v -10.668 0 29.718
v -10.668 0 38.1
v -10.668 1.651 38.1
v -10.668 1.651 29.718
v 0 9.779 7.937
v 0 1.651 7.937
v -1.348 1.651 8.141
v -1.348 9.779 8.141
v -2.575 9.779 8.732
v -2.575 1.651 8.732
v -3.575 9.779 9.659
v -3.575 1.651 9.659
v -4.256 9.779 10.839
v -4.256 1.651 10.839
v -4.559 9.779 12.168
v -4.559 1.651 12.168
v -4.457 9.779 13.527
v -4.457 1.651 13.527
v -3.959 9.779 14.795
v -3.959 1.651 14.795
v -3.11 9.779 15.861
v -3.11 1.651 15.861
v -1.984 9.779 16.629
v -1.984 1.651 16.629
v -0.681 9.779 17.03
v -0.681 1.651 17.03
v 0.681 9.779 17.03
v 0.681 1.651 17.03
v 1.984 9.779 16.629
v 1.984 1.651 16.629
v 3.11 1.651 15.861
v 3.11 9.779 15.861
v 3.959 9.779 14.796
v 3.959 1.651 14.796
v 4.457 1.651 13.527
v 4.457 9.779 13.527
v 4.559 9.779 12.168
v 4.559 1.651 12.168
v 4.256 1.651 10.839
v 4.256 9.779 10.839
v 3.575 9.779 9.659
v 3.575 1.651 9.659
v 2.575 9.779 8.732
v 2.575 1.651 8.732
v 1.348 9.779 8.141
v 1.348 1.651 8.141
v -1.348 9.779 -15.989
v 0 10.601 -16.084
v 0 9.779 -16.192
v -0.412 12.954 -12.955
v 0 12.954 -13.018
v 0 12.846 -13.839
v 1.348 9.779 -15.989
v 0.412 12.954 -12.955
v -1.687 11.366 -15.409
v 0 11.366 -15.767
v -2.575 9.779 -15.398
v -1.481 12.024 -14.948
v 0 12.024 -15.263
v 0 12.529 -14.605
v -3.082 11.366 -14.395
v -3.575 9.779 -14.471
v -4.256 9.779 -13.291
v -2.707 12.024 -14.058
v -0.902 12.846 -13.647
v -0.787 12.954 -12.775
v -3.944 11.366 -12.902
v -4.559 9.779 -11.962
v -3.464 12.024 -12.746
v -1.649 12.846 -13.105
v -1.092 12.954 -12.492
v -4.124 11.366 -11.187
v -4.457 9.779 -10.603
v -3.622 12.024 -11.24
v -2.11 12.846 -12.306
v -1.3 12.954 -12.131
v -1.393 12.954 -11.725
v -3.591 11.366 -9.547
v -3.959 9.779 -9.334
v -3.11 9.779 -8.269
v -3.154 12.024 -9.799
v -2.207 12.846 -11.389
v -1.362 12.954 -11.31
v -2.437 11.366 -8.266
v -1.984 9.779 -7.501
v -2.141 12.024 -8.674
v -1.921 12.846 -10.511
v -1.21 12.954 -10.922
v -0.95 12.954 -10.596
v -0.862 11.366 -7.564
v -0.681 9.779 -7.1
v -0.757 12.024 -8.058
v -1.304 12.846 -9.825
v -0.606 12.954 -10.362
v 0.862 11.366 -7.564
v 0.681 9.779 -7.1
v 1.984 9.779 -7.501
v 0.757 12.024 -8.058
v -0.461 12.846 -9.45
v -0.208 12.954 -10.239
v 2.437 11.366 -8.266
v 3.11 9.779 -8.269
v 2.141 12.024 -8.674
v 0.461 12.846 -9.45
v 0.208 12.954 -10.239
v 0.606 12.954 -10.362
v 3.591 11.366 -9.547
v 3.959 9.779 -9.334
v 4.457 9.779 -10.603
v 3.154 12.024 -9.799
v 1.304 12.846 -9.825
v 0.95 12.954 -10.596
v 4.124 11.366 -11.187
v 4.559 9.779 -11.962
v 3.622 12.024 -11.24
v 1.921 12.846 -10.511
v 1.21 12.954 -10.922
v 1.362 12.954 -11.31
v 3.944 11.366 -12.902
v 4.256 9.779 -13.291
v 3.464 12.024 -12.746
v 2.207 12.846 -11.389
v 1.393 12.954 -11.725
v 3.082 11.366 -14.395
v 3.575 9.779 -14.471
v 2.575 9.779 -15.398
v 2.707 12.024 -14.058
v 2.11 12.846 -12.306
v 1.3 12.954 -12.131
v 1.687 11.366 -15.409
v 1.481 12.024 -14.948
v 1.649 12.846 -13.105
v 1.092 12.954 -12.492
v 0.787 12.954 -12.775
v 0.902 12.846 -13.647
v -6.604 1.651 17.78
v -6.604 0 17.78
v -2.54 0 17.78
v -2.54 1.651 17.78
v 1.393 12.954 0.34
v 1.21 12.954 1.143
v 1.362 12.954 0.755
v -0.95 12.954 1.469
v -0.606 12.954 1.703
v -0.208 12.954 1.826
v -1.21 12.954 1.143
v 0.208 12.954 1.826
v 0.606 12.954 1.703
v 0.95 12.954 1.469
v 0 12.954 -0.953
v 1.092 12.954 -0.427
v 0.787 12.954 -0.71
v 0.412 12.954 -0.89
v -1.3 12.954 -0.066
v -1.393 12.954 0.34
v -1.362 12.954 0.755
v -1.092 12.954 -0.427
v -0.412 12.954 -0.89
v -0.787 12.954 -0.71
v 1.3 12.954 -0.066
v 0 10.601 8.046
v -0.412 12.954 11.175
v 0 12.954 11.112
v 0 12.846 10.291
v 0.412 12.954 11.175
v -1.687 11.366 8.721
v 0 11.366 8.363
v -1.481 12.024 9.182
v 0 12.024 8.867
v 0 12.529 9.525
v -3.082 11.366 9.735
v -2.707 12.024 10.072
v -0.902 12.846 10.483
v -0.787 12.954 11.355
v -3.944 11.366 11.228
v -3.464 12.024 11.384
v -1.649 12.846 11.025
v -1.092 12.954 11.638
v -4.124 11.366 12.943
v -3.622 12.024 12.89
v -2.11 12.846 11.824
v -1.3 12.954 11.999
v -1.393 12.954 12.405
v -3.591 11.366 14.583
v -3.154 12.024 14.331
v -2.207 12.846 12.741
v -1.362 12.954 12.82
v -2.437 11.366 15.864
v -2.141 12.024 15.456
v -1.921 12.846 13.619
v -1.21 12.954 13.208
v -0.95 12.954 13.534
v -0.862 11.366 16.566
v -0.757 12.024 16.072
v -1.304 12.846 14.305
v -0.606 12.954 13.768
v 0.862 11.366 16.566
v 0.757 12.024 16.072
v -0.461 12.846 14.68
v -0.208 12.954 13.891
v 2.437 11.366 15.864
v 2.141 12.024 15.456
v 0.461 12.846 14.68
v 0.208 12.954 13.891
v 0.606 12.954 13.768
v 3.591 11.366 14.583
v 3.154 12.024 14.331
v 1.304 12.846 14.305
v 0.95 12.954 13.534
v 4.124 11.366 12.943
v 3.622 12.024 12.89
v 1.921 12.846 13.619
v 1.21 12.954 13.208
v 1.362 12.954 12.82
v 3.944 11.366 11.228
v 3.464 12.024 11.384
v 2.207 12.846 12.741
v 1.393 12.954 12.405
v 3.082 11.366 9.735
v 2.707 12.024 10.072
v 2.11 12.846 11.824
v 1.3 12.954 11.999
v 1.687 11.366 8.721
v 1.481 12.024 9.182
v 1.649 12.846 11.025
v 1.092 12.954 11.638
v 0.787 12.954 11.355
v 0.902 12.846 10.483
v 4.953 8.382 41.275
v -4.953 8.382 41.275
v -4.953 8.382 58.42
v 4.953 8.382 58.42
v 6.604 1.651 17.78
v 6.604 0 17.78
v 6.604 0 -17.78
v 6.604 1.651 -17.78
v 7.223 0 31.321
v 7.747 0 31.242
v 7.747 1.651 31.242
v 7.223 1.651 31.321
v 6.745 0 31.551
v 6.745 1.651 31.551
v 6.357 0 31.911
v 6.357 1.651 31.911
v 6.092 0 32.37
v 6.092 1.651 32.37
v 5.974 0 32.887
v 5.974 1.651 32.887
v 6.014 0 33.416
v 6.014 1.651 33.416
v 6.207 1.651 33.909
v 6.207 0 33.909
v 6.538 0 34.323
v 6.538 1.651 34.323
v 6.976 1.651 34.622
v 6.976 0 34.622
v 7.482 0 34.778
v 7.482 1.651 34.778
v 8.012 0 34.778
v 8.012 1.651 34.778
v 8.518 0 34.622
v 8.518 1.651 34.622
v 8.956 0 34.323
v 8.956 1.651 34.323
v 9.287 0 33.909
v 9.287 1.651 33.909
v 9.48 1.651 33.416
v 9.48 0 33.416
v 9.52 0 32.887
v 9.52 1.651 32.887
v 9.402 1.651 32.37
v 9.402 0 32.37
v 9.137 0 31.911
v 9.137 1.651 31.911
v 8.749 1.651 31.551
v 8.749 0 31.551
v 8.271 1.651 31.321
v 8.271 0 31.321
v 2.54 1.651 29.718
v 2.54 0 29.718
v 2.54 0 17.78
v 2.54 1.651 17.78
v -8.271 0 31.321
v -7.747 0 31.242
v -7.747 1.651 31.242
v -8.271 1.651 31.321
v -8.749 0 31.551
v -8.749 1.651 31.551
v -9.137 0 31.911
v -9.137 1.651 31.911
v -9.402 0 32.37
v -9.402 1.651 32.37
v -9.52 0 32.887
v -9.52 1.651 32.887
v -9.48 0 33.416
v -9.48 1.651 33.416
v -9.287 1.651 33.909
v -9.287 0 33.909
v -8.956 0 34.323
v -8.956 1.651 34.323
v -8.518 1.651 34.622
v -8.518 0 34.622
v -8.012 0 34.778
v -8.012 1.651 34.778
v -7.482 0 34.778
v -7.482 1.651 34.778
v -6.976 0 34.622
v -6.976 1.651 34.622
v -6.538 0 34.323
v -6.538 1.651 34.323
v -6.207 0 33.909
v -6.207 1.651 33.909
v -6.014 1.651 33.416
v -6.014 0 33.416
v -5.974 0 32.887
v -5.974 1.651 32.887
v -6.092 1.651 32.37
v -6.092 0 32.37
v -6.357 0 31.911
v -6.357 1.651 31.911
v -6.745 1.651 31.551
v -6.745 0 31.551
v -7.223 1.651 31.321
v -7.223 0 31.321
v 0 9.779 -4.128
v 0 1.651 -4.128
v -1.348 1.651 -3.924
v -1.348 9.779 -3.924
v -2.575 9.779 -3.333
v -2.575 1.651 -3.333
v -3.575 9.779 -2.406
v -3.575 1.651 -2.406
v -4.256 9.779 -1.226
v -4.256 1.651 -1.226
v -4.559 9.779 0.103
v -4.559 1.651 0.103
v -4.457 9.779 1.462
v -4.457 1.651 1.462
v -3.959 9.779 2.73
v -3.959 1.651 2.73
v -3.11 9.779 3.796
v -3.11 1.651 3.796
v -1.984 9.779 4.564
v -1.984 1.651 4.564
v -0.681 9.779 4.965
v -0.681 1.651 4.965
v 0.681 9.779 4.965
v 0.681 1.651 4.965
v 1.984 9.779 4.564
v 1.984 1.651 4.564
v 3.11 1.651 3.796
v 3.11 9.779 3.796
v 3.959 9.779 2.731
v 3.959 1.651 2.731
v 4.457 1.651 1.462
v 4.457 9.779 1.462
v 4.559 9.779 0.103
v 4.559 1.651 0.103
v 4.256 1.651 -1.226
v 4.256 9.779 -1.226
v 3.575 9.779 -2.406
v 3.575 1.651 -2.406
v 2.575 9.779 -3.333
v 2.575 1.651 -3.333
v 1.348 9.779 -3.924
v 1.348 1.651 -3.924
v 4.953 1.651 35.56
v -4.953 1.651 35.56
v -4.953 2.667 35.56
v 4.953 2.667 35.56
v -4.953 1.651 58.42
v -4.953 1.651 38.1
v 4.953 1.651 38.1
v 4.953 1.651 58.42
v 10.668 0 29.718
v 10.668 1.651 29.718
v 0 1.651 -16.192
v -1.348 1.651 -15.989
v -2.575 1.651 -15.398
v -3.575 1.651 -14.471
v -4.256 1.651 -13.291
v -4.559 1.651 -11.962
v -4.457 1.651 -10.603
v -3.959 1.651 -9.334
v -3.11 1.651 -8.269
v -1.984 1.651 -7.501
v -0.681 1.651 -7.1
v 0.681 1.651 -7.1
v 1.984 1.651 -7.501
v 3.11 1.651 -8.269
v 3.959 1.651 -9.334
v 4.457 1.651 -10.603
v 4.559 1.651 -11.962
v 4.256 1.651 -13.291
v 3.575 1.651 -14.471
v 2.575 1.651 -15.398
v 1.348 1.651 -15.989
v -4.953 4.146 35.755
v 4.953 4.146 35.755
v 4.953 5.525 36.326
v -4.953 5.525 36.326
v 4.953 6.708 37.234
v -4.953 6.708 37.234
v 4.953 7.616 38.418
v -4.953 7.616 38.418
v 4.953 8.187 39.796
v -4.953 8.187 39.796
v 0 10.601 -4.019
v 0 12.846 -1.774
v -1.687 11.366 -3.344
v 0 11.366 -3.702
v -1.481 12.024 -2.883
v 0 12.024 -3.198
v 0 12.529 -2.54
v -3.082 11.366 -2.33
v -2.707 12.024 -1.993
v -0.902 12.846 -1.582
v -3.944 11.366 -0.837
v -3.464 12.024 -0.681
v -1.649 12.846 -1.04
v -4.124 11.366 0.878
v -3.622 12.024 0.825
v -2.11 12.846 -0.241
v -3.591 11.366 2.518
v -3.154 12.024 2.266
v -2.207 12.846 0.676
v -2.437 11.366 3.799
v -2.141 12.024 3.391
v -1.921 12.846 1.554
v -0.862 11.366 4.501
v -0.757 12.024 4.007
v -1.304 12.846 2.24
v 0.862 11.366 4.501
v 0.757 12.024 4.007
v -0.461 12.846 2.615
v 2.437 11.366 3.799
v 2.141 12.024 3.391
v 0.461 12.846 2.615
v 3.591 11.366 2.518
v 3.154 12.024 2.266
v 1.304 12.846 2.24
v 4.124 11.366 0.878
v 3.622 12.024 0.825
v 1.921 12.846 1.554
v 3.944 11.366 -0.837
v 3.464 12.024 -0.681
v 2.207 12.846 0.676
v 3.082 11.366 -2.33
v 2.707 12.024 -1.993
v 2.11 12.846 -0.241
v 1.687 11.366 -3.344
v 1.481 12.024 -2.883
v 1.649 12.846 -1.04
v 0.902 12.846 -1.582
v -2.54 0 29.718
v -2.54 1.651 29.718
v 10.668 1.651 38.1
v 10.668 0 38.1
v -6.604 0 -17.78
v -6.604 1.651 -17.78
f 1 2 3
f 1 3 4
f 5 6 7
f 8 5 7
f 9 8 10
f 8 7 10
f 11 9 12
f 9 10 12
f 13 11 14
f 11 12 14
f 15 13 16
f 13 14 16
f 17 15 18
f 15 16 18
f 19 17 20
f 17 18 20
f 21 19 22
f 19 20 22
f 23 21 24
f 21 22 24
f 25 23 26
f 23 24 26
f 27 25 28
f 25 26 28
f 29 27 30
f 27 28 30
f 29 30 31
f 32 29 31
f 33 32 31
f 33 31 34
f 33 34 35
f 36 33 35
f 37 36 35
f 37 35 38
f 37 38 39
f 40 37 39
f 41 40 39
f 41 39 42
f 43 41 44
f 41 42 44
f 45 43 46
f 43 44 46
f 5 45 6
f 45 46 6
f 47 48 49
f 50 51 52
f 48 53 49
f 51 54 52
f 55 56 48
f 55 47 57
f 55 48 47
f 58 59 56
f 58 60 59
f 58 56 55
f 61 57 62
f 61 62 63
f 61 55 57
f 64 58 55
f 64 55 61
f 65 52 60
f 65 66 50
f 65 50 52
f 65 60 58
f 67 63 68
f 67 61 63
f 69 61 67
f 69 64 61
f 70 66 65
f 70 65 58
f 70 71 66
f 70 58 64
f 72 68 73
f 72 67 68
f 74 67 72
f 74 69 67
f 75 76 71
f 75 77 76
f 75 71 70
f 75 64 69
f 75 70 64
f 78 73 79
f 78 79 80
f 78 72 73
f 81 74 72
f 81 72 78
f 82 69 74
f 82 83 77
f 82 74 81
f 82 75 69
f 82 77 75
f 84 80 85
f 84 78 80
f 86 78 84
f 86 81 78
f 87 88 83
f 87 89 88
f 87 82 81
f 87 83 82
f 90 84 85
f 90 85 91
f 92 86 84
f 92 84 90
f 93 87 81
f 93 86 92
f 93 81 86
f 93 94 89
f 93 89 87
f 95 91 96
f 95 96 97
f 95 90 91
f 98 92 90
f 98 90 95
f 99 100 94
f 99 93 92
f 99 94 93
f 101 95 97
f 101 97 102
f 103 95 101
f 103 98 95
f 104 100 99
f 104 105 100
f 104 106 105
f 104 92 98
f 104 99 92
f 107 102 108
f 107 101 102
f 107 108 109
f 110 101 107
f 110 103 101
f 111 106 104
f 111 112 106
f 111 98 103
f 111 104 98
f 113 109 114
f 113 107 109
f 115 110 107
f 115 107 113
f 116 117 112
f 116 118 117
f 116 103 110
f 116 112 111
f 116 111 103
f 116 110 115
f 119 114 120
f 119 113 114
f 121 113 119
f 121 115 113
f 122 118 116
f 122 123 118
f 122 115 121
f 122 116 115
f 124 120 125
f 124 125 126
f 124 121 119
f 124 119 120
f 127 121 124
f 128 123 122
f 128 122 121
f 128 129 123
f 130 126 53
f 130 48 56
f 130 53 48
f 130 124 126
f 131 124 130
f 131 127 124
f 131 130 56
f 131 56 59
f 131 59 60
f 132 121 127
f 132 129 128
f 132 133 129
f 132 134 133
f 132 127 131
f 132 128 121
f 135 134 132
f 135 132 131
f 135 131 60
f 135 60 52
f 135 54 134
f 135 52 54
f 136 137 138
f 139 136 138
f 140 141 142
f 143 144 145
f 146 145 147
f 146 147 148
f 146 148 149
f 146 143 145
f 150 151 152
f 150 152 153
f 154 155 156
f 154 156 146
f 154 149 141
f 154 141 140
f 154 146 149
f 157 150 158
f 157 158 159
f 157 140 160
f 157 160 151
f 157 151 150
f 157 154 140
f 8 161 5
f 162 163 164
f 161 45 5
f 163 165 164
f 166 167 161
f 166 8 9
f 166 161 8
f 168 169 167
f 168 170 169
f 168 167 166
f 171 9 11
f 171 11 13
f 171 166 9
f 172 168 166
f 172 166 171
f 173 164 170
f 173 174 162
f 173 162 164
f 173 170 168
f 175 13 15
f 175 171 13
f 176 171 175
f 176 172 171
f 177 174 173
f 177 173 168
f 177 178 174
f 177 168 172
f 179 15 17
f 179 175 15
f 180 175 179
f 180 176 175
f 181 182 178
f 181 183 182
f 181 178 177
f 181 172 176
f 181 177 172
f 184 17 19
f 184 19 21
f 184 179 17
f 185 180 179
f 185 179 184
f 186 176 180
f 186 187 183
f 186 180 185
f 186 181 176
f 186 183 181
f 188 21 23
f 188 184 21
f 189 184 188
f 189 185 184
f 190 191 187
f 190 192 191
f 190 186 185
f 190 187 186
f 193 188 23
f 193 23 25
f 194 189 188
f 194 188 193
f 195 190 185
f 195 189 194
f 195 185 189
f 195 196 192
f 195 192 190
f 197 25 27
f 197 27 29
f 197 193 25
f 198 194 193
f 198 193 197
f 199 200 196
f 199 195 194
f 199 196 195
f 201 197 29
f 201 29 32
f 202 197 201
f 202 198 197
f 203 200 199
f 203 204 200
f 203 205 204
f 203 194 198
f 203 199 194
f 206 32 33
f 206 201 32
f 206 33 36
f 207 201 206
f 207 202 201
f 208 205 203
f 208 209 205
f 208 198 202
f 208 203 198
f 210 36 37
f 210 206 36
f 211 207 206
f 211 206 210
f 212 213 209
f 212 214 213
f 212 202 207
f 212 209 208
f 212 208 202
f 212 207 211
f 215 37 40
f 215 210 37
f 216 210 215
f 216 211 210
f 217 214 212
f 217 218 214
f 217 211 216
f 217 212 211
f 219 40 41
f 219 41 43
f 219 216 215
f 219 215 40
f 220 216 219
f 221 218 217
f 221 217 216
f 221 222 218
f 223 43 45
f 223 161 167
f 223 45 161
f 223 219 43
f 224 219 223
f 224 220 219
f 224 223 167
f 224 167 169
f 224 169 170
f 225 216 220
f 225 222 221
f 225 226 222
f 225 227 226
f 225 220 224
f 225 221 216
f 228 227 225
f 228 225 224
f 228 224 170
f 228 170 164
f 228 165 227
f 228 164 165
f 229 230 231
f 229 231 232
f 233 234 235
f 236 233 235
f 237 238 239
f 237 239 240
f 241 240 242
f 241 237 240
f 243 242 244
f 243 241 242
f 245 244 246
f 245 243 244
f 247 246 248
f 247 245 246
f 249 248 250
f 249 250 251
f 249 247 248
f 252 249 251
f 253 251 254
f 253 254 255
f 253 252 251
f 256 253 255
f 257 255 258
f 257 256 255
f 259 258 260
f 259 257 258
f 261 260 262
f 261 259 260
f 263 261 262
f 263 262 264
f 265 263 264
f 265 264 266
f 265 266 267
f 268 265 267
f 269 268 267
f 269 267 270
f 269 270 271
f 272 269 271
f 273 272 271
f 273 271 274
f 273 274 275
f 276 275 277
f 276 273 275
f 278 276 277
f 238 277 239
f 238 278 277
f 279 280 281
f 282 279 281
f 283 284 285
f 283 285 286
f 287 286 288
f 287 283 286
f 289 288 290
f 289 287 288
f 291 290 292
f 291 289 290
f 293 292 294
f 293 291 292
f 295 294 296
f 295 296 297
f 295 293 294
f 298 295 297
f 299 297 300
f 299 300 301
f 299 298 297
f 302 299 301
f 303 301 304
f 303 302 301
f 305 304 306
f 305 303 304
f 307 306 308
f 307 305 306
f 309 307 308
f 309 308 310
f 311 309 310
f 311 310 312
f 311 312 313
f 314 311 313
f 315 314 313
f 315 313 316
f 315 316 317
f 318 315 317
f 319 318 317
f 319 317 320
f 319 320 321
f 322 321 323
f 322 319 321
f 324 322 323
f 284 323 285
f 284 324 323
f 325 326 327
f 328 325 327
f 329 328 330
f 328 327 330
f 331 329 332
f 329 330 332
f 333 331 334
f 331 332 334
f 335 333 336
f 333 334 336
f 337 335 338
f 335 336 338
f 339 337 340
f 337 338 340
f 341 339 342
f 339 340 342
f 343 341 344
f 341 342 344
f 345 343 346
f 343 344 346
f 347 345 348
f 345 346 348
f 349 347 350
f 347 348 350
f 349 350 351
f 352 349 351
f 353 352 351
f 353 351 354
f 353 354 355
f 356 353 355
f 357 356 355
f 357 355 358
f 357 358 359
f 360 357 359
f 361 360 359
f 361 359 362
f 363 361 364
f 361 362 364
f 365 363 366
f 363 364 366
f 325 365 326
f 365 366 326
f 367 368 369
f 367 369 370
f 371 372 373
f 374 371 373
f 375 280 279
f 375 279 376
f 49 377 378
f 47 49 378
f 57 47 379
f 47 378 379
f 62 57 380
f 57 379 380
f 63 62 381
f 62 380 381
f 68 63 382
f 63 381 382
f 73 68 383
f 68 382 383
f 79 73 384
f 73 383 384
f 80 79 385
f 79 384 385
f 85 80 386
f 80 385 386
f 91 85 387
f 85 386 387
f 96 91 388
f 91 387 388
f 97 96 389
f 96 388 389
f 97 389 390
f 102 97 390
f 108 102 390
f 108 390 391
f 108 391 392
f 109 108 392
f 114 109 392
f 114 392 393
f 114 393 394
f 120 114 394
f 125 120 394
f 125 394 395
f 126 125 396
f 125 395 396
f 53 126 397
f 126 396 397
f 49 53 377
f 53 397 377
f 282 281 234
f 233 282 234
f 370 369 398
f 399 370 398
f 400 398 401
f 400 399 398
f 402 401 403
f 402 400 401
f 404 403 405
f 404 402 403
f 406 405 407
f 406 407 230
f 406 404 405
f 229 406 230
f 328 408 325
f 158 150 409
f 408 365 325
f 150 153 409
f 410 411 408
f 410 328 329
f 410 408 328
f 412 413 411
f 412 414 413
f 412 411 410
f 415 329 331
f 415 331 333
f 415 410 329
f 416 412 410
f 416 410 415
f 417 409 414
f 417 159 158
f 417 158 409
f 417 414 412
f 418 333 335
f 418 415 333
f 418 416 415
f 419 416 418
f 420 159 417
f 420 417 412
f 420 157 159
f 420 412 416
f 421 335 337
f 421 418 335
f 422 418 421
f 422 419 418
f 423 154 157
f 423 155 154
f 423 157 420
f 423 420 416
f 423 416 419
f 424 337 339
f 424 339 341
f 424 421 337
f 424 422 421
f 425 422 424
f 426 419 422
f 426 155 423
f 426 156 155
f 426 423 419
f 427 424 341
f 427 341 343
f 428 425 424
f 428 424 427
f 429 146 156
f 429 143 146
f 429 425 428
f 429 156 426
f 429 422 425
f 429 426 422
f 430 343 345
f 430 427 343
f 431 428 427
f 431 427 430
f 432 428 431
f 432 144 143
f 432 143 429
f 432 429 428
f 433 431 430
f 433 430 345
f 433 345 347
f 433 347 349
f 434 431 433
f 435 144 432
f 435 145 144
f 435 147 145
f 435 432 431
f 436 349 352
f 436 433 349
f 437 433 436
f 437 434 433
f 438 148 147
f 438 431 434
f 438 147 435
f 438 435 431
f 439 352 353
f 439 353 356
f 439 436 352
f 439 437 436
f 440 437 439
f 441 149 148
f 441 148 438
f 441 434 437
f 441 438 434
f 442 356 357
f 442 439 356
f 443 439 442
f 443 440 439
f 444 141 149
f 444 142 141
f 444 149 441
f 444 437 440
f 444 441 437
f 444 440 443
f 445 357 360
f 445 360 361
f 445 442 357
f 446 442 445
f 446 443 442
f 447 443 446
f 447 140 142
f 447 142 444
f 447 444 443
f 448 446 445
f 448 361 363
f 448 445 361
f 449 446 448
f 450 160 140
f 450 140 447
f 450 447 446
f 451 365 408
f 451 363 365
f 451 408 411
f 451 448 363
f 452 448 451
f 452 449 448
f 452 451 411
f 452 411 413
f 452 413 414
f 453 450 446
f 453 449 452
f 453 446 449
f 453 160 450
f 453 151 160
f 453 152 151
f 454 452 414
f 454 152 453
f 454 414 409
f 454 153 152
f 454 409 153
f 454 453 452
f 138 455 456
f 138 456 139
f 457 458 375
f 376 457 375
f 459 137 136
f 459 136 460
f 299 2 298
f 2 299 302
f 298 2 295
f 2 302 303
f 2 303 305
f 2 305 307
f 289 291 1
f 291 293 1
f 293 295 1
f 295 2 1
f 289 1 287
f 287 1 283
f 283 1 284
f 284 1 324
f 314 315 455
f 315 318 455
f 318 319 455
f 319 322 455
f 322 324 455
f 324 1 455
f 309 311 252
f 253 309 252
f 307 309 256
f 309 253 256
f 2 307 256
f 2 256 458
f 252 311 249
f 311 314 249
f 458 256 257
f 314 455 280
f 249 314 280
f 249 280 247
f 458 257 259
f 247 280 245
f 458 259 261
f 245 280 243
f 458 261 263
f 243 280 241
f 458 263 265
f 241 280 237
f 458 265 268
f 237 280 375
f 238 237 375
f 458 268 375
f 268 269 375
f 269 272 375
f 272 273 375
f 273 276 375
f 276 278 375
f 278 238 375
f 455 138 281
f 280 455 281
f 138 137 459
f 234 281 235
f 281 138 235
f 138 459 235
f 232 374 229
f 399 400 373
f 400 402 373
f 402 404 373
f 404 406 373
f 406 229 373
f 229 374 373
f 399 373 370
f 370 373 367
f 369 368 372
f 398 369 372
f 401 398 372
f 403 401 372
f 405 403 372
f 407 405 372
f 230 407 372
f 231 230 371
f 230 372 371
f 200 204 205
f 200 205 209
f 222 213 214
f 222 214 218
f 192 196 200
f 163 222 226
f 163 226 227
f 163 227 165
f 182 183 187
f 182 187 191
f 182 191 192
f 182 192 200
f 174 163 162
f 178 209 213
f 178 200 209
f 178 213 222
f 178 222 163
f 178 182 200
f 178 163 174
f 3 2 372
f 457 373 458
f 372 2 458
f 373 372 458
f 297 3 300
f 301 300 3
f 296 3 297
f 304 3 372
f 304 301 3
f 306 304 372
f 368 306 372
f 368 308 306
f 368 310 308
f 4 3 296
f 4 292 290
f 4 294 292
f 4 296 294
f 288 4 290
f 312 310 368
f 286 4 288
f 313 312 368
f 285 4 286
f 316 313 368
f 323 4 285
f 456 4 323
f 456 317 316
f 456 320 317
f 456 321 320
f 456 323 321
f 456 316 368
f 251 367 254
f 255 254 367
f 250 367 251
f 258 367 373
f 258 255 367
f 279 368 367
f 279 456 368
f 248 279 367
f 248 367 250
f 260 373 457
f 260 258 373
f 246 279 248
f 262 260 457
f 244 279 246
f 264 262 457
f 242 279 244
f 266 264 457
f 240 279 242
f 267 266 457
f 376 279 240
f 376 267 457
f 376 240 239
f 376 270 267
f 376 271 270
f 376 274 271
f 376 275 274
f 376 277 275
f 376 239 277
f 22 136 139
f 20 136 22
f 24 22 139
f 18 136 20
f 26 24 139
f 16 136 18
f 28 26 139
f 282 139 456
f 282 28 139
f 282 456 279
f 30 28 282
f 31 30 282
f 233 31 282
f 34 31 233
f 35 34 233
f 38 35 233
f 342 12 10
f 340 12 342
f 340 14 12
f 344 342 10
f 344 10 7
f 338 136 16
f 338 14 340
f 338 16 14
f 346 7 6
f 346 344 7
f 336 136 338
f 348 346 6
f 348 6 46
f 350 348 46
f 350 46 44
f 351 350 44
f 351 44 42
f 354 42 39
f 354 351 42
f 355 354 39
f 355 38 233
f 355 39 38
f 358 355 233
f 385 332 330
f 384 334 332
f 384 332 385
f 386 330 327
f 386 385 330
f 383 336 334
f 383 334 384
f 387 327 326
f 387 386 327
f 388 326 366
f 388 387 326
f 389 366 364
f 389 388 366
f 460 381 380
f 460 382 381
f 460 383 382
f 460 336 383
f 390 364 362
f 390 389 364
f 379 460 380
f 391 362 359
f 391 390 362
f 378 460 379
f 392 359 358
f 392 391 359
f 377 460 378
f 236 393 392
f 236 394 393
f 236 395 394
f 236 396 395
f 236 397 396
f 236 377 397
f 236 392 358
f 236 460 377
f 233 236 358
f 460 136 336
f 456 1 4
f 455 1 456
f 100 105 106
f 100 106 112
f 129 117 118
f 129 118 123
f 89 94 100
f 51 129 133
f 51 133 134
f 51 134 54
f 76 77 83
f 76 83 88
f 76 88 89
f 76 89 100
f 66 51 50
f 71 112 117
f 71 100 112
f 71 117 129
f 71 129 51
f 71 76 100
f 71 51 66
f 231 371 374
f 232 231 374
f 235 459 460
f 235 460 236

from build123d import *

# Parameters (mm, degrees)
SKETCH1_W           = 13.208
SKETCH1_H           = 35.56
SKETCH1_W_2         = 5.08
SKETCH1_H_2         = 11.938
SKETCH1_W_3         = 21.336
SKETCH1_H_3         = 8.382
SKETCH1_R           = 1.778
BOSS_EXTRUDE1_DEPTH = 1.651
SKETCH2_R           = 4.572
BOSS_EXTRUDE2_DEPTH = 11.303
FILLET1_R           = 3.175
SKETCH3_W           = 9.906
SKETCH3_H           = 2.54
SKETCH3_H_2         = 20.32
BOSS_EXTRUDE3_DEPTH = 6.731
FILLET2_R           = 5.715


with BuildPart() as part:
    # Sketch1 → Boss-Extrude1 (new body)
    # profile 1 of 3: a face of its own
    with BuildSketch(Plane(origin=(0, 0, 0), x_dir=(1, 0, 0), z_dir=(0, 1, 0))):
        Rectangle(SKETCH1_W, SKETCH1_H)
    # profile 2 of 3: a face of its own
    with BuildSketch(Plane(origin=(0, 0, 0), x_dir=(1, 0, 0), z_dir=(0, 1, 0))):
        with Locations((0, -23.749)):
            Rectangle(SKETCH1_W_2, SKETCH1_H_2)
    # profile 3 of 3: a face of its own
    with BuildSketch(Plane(origin=(0, 0, 0), x_dir=(1, 0, 0), z_dir=(0, 1, 0))):
        with Locations((0, -33.909)):
            Rectangle(SKETCH1_W_3, SKETCH1_H_3)
        with Locations(Location((-7.747, -33.02, 0), (0, 0, 90))):
            Circle(SKETCH1_R, mode=Mode.SUBTRACT)
        with Locations(Location((7.747, -33.02, 0), (0, 0, 90))):
            Circle(SKETCH1_R, mode=Mode.SUBTRACT)
    extrude(amount=BOSS_EXTRUDE1_DEPTH)

    # Sketch2 → Boss-Extrude2 (add)
    with BuildSketch(Plane(origin=(0, 1.651, 0), x_dir=(1, 0, 0), z_dir=(0, 1, 0))):
        with Locations(Location((0, 11.6205, 0), (0, 0, 90))):
            Circle(SKETCH2_R)
        with Locations(Location((0, -0.4445, 0), (0, 0, 90))):
            Circle(SKETCH2_R)
        with Locations(Location((0, -12.5095, 0), (0, 0, 90))):
            Circle(SKETCH2_R)
    extrude(amount=BOSS_EXTRUDE2_DEPTH)

    # Fillet1
    fillet1_edges = [part.edges().sort_by_distance(p)[0] for p in [
        (0, 12.954, -7.0485),
        (0, 12.954, 5.0165),
        (0, 12.954, 17.0815),
    ]]
    fillet(fillet1_edges, radius=FILLET1_R)

    # Sketch3 → Boss-Extrude3 (add)
    with BuildSketch(Plane(origin=(0, 1.651, 0), x_dir=(1, 0, 0), z_dir=(0, 1, 0))):
        with Locations((0, -36.83)):
            Rectangle(SKETCH3_W, SKETCH3_H)
        with Locations((0, -48.26)):
            Rectangle(SKETCH3_W, SKETCH3_H_2)
    extrude(amount=BOSS_EXTRUDE3_DEPTH)

    # Fillet2
    fillet2_edges = [part.edges().sort_by_distance(p)[0] for p in [
        (0, 8.382, 35.56),
    ]]
    fillet(fillet2_edges, radius=FILLET2_R)


solid = part.part
